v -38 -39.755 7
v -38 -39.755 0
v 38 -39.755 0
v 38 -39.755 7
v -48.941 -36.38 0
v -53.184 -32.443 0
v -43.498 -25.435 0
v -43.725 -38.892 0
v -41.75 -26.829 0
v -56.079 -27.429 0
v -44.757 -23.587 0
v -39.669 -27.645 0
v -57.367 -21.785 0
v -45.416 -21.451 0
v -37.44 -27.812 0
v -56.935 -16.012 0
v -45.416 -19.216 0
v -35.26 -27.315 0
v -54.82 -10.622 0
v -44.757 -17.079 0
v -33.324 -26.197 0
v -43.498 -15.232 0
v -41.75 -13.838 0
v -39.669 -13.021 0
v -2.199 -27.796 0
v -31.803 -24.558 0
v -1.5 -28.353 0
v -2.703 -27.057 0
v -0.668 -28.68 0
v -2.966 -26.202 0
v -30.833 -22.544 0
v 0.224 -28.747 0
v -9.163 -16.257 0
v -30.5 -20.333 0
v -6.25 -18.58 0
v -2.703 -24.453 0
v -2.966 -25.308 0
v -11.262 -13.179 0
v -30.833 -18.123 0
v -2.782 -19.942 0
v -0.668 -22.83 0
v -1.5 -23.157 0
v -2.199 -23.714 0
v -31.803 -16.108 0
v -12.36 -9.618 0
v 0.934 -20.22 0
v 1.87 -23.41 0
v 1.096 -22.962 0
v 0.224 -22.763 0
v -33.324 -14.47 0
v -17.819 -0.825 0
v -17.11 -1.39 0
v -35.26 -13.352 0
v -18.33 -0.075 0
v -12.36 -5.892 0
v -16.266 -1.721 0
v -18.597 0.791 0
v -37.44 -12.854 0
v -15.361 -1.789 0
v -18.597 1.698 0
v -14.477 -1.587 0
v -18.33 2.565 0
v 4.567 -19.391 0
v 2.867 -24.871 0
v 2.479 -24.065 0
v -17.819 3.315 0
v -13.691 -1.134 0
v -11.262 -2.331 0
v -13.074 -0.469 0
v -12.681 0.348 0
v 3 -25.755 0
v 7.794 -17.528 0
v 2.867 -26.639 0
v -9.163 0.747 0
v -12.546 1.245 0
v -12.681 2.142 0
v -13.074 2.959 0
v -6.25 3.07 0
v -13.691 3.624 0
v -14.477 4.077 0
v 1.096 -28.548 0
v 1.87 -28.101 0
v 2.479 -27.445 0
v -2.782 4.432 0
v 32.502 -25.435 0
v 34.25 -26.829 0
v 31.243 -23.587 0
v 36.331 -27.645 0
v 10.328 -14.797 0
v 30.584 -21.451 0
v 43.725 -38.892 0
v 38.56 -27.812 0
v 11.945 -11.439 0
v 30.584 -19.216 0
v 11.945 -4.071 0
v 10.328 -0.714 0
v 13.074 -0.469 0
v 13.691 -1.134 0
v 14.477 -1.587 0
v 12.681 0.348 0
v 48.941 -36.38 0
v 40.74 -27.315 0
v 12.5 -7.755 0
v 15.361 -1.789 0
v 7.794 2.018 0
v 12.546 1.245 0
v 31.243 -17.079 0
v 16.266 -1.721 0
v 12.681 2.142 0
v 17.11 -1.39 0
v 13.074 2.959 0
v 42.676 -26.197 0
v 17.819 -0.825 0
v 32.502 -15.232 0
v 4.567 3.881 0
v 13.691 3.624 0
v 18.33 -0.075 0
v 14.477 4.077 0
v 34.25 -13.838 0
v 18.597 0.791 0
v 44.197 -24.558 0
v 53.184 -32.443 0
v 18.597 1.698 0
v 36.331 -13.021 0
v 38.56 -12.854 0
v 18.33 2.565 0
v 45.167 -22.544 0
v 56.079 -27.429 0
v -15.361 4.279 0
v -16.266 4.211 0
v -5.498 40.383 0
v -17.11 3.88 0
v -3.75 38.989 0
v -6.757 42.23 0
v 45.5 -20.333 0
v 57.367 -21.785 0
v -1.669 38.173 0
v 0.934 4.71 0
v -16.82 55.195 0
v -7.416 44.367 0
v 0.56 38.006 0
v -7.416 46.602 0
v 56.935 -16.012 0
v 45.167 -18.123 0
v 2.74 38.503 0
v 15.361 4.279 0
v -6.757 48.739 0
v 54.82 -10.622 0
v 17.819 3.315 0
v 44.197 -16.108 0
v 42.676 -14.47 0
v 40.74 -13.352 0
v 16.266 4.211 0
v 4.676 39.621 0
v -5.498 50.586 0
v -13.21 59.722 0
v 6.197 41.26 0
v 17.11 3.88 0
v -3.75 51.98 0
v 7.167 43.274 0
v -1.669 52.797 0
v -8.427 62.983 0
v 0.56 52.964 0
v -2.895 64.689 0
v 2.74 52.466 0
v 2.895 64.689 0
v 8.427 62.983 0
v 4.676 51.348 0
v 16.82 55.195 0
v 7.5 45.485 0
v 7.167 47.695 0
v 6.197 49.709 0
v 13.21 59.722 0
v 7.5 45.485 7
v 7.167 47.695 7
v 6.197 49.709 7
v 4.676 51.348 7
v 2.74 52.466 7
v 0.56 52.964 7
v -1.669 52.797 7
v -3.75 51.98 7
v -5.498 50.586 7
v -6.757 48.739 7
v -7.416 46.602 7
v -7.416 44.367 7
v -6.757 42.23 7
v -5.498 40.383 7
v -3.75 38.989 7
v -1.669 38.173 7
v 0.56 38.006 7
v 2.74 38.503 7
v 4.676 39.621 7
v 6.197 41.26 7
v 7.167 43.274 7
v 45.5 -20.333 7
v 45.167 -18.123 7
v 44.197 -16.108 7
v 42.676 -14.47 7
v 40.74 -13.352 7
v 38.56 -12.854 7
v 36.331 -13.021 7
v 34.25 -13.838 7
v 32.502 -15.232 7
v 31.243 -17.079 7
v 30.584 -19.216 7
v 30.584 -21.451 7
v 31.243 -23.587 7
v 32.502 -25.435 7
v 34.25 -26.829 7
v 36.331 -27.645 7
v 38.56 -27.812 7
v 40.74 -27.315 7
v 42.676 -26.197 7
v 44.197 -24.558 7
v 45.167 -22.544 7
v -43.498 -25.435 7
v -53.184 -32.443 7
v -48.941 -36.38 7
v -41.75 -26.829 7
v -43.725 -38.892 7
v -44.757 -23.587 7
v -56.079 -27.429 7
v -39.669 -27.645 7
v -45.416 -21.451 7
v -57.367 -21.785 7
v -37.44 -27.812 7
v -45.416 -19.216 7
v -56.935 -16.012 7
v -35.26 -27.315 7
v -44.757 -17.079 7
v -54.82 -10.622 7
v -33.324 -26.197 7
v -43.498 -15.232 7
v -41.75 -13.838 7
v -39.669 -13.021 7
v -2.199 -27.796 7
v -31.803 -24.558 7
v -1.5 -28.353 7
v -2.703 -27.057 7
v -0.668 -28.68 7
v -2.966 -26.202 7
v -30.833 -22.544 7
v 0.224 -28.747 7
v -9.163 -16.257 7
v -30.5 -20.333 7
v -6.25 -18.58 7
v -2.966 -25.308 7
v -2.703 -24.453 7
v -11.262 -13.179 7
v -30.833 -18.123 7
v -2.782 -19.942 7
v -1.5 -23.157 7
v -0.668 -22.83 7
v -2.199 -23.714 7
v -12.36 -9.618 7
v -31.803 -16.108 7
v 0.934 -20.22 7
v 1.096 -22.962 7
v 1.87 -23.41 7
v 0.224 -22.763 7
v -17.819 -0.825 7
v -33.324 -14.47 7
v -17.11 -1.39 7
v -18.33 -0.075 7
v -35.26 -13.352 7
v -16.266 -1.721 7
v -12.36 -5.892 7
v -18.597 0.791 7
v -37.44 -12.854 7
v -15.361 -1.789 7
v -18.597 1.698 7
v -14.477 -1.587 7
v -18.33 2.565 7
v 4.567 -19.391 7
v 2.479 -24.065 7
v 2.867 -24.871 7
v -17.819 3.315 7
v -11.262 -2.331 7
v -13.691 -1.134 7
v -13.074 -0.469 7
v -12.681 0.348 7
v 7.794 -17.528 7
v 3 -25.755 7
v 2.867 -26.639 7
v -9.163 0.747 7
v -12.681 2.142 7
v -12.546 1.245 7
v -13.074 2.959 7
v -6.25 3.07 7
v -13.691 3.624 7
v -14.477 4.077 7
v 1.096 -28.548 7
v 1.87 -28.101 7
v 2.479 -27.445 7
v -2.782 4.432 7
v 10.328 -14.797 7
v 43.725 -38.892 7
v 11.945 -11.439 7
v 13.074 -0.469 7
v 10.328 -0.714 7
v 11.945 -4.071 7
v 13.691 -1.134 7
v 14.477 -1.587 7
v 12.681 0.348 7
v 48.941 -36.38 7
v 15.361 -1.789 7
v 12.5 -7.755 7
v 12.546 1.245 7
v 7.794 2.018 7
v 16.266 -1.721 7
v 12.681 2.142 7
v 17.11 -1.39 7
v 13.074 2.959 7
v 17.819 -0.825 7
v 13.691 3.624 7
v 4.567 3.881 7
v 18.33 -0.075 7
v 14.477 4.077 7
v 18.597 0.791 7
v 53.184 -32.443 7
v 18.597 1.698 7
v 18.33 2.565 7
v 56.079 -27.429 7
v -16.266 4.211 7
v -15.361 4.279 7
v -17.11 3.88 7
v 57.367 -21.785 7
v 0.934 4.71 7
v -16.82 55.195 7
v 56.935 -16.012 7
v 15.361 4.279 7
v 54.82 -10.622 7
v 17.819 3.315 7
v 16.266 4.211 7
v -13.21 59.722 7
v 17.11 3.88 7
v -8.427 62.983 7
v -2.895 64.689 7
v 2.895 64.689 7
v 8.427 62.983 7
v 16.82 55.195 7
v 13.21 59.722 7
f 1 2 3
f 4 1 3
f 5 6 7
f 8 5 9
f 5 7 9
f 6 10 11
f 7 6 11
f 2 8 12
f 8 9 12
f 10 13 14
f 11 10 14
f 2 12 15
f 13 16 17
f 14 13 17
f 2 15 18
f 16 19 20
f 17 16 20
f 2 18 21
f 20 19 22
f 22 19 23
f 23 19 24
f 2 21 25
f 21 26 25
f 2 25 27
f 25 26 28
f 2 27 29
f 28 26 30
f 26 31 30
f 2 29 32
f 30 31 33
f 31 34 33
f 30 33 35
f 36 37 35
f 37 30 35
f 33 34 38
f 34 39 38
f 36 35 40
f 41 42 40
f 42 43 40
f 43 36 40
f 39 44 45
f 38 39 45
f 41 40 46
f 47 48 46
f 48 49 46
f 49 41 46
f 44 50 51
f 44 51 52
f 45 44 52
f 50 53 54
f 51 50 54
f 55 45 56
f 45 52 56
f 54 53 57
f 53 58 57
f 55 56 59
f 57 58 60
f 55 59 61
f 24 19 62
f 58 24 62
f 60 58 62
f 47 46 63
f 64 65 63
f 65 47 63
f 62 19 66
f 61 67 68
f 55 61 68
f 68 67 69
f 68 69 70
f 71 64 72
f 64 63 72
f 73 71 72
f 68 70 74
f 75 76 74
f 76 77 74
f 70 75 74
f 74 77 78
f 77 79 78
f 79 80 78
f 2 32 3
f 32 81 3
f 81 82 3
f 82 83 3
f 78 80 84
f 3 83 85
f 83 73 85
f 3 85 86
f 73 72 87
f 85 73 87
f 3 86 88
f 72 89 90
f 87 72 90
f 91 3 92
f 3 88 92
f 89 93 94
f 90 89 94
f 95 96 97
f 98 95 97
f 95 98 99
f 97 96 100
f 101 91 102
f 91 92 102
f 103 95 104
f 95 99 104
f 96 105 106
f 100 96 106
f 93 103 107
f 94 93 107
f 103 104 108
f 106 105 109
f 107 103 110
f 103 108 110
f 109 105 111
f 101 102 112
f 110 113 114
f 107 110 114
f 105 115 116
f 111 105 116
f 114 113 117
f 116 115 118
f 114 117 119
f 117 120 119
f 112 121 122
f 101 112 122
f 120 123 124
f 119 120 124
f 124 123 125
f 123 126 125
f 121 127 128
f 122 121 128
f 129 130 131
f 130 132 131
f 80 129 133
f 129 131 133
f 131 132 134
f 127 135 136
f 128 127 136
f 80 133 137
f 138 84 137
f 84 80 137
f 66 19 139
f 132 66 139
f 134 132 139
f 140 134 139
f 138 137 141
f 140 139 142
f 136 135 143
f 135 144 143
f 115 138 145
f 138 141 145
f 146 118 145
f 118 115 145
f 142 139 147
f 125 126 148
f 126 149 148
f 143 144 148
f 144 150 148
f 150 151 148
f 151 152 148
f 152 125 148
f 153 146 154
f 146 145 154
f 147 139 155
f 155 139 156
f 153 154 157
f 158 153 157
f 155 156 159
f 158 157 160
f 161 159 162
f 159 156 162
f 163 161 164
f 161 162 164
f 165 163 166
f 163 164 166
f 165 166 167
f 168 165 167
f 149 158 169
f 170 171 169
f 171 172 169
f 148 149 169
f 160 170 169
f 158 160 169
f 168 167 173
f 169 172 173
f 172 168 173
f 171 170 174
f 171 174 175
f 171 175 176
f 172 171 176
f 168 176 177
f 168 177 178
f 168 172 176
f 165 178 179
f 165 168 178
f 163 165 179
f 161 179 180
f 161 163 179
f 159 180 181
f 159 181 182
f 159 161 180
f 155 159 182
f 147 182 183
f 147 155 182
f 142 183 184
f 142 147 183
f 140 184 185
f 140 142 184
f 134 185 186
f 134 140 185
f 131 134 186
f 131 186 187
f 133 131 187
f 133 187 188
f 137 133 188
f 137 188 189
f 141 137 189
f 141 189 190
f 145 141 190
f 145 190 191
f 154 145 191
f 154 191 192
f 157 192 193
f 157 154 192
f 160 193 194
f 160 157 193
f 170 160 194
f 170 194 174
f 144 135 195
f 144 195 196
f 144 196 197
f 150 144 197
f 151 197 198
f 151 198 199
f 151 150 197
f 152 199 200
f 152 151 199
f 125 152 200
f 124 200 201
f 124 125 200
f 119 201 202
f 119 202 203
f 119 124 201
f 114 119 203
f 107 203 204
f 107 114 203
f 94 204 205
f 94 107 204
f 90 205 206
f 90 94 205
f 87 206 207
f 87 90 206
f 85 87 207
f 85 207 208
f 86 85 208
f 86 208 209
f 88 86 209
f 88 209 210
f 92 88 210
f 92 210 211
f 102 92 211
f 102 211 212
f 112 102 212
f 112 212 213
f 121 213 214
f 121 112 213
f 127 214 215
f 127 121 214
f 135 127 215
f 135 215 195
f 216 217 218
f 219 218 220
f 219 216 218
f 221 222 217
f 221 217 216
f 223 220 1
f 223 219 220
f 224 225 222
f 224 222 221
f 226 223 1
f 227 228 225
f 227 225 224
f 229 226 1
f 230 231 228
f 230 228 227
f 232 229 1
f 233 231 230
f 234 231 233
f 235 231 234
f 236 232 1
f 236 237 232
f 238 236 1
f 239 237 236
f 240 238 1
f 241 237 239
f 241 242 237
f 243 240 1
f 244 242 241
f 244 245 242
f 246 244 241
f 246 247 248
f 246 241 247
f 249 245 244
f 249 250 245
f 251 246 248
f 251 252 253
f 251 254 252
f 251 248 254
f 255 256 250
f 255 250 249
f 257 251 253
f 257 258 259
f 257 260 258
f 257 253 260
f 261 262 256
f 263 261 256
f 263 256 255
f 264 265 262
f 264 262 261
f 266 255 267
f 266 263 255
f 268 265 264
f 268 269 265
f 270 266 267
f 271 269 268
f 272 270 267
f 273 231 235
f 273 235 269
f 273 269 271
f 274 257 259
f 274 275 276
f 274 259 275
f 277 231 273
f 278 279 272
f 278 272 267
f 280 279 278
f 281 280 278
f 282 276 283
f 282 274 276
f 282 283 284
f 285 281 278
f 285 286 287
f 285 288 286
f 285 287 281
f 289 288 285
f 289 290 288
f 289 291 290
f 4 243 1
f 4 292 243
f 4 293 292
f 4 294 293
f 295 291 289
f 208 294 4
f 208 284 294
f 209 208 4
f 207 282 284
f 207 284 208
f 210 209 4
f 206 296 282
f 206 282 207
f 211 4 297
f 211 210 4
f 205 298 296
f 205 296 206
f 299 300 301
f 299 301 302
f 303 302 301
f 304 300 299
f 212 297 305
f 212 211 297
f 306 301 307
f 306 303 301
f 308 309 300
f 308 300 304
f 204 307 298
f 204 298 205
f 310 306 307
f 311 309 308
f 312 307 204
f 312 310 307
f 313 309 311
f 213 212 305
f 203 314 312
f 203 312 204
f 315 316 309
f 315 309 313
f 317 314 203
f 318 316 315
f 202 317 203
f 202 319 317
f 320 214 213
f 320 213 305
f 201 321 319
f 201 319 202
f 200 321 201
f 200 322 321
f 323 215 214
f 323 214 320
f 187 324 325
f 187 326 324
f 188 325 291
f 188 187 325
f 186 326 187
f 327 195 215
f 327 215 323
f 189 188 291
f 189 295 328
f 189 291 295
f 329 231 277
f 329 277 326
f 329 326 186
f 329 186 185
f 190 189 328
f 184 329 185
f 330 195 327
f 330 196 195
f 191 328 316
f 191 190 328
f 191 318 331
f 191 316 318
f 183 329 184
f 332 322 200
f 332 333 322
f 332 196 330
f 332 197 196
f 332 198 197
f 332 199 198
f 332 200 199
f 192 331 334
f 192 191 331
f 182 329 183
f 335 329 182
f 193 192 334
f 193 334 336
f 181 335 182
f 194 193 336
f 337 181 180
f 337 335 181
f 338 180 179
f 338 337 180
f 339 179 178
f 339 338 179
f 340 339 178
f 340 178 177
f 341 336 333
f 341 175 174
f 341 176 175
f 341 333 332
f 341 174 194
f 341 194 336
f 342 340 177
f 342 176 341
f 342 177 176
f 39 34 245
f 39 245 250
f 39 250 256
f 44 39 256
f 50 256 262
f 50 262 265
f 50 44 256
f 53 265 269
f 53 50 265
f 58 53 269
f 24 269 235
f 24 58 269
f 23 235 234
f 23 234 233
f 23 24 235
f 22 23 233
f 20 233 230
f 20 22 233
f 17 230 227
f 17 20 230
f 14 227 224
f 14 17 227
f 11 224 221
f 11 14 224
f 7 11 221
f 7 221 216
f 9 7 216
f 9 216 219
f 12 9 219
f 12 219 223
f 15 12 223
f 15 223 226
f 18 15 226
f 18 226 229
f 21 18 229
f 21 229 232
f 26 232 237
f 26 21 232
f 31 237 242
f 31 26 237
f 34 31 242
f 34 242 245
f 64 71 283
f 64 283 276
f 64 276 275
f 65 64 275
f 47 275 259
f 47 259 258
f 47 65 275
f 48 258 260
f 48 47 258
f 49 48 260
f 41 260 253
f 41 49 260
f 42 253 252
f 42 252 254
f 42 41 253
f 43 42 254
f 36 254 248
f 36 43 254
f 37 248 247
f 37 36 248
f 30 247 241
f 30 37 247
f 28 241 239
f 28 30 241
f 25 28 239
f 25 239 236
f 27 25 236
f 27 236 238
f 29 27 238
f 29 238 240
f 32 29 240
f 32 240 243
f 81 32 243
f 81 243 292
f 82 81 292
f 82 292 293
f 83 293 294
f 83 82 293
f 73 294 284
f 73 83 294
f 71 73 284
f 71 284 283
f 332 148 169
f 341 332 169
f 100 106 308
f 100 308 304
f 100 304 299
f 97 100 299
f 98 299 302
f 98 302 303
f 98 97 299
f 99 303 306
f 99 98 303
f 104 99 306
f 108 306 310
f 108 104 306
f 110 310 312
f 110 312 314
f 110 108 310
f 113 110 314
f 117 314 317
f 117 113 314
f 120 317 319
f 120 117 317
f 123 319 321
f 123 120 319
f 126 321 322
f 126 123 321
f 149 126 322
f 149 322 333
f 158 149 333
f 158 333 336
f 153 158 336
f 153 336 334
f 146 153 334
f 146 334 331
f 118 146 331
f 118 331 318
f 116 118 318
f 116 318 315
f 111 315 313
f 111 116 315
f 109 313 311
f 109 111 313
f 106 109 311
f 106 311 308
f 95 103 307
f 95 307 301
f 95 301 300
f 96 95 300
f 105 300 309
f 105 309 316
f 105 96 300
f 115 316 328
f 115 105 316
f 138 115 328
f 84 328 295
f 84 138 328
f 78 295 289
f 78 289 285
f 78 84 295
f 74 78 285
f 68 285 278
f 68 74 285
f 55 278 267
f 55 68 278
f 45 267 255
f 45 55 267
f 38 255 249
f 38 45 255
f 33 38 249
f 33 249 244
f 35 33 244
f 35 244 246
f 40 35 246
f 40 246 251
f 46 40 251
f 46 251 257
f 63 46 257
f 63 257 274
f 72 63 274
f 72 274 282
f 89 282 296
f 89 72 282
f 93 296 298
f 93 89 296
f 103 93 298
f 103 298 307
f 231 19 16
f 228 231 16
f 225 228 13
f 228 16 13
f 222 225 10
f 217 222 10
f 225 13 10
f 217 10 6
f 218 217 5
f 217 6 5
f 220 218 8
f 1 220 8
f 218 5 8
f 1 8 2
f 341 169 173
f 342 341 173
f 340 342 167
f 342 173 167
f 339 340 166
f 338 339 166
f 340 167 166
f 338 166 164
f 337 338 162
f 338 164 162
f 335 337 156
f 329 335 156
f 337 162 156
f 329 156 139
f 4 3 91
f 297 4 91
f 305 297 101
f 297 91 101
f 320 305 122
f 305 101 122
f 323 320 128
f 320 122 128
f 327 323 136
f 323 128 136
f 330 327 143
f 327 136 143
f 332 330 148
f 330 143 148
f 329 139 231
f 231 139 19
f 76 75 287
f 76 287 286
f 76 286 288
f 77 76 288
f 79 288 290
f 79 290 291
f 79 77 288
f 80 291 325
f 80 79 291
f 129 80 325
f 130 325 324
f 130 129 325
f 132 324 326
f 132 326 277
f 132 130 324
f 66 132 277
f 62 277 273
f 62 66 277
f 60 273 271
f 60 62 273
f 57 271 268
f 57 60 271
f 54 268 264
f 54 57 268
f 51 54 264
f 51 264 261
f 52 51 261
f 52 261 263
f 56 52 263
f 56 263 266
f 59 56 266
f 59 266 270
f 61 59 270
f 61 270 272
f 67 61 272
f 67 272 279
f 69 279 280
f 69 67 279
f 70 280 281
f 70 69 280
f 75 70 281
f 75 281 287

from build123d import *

# Parameters (mm, degrees)
SKETCH1_R           = 7.5
SKETCH1_R_2         = 12.5
SKETCH1_R_3         = 3
SKETCH1_R_4         = 3.042653236
BOSS_EXTRUDE1_DEPTH = 7


with BuildPart() as part:
    # Sketch1 → Boss-Extrude1 (new body)
    with BuildSketch(Plane.XY):
        with BuildLine():
            Line((-16.819672131, 55.195439587), (-54.819672131, -10.622491101))
            ThreePointArc((-54.819672131, -10.622491101), (-54.819672131, -30.044175566), (-38, -39.755017799))
            Line((-38, -39.755017799), (38, -39.755017799))
            ThreePointArc((38, -39.755017799), (54.819672131, -30.044175566), (54.819672131, -10.622491101))
            Line((54.819672131, -10.622491101), (16.819672131, 55.195439587))
            ThreePointArc((16.819672131, 55.195439587), (0, 64.906281819), (-16.819672131, 55.195439587))
        make_face()
        with Locations((0, 45.484597354)):
            Circle(SKETCH1_R, mode=Mode.SUBTRACT)
        with Locations((38, -20.333333333)):
            Circle(SKETCH1_R, mode=Mode.SUBTRACT)
        with Locations((-38, -20.333333333)):
            Circle(SKETCH1_R, mode=Mode.SUBTRACT)
        with Locations((0, -7.755017799)):
            Circle(SKETCH1_R_2, mode=Mode.SUBTRACT)
        with Locations((0, -25.755017799)):
            Circle(SKETCH1_R_3, mode=Mode.SUBTRACT)
        with Locations((-15.588457268, 1.244982201)):
            Circle(SKETCH1_R_4, mode=Mode.SUBTRACT)
        with Locations(Location((15.588457268, 1.244982201, 0), (0, 0, 180))):
            Circle(SKETCH1_R_4, mode=Mode.SUBTRACT)
    extrude(amount=BOSS_EXTRUDE1_DEPTH)


solid = part.part
